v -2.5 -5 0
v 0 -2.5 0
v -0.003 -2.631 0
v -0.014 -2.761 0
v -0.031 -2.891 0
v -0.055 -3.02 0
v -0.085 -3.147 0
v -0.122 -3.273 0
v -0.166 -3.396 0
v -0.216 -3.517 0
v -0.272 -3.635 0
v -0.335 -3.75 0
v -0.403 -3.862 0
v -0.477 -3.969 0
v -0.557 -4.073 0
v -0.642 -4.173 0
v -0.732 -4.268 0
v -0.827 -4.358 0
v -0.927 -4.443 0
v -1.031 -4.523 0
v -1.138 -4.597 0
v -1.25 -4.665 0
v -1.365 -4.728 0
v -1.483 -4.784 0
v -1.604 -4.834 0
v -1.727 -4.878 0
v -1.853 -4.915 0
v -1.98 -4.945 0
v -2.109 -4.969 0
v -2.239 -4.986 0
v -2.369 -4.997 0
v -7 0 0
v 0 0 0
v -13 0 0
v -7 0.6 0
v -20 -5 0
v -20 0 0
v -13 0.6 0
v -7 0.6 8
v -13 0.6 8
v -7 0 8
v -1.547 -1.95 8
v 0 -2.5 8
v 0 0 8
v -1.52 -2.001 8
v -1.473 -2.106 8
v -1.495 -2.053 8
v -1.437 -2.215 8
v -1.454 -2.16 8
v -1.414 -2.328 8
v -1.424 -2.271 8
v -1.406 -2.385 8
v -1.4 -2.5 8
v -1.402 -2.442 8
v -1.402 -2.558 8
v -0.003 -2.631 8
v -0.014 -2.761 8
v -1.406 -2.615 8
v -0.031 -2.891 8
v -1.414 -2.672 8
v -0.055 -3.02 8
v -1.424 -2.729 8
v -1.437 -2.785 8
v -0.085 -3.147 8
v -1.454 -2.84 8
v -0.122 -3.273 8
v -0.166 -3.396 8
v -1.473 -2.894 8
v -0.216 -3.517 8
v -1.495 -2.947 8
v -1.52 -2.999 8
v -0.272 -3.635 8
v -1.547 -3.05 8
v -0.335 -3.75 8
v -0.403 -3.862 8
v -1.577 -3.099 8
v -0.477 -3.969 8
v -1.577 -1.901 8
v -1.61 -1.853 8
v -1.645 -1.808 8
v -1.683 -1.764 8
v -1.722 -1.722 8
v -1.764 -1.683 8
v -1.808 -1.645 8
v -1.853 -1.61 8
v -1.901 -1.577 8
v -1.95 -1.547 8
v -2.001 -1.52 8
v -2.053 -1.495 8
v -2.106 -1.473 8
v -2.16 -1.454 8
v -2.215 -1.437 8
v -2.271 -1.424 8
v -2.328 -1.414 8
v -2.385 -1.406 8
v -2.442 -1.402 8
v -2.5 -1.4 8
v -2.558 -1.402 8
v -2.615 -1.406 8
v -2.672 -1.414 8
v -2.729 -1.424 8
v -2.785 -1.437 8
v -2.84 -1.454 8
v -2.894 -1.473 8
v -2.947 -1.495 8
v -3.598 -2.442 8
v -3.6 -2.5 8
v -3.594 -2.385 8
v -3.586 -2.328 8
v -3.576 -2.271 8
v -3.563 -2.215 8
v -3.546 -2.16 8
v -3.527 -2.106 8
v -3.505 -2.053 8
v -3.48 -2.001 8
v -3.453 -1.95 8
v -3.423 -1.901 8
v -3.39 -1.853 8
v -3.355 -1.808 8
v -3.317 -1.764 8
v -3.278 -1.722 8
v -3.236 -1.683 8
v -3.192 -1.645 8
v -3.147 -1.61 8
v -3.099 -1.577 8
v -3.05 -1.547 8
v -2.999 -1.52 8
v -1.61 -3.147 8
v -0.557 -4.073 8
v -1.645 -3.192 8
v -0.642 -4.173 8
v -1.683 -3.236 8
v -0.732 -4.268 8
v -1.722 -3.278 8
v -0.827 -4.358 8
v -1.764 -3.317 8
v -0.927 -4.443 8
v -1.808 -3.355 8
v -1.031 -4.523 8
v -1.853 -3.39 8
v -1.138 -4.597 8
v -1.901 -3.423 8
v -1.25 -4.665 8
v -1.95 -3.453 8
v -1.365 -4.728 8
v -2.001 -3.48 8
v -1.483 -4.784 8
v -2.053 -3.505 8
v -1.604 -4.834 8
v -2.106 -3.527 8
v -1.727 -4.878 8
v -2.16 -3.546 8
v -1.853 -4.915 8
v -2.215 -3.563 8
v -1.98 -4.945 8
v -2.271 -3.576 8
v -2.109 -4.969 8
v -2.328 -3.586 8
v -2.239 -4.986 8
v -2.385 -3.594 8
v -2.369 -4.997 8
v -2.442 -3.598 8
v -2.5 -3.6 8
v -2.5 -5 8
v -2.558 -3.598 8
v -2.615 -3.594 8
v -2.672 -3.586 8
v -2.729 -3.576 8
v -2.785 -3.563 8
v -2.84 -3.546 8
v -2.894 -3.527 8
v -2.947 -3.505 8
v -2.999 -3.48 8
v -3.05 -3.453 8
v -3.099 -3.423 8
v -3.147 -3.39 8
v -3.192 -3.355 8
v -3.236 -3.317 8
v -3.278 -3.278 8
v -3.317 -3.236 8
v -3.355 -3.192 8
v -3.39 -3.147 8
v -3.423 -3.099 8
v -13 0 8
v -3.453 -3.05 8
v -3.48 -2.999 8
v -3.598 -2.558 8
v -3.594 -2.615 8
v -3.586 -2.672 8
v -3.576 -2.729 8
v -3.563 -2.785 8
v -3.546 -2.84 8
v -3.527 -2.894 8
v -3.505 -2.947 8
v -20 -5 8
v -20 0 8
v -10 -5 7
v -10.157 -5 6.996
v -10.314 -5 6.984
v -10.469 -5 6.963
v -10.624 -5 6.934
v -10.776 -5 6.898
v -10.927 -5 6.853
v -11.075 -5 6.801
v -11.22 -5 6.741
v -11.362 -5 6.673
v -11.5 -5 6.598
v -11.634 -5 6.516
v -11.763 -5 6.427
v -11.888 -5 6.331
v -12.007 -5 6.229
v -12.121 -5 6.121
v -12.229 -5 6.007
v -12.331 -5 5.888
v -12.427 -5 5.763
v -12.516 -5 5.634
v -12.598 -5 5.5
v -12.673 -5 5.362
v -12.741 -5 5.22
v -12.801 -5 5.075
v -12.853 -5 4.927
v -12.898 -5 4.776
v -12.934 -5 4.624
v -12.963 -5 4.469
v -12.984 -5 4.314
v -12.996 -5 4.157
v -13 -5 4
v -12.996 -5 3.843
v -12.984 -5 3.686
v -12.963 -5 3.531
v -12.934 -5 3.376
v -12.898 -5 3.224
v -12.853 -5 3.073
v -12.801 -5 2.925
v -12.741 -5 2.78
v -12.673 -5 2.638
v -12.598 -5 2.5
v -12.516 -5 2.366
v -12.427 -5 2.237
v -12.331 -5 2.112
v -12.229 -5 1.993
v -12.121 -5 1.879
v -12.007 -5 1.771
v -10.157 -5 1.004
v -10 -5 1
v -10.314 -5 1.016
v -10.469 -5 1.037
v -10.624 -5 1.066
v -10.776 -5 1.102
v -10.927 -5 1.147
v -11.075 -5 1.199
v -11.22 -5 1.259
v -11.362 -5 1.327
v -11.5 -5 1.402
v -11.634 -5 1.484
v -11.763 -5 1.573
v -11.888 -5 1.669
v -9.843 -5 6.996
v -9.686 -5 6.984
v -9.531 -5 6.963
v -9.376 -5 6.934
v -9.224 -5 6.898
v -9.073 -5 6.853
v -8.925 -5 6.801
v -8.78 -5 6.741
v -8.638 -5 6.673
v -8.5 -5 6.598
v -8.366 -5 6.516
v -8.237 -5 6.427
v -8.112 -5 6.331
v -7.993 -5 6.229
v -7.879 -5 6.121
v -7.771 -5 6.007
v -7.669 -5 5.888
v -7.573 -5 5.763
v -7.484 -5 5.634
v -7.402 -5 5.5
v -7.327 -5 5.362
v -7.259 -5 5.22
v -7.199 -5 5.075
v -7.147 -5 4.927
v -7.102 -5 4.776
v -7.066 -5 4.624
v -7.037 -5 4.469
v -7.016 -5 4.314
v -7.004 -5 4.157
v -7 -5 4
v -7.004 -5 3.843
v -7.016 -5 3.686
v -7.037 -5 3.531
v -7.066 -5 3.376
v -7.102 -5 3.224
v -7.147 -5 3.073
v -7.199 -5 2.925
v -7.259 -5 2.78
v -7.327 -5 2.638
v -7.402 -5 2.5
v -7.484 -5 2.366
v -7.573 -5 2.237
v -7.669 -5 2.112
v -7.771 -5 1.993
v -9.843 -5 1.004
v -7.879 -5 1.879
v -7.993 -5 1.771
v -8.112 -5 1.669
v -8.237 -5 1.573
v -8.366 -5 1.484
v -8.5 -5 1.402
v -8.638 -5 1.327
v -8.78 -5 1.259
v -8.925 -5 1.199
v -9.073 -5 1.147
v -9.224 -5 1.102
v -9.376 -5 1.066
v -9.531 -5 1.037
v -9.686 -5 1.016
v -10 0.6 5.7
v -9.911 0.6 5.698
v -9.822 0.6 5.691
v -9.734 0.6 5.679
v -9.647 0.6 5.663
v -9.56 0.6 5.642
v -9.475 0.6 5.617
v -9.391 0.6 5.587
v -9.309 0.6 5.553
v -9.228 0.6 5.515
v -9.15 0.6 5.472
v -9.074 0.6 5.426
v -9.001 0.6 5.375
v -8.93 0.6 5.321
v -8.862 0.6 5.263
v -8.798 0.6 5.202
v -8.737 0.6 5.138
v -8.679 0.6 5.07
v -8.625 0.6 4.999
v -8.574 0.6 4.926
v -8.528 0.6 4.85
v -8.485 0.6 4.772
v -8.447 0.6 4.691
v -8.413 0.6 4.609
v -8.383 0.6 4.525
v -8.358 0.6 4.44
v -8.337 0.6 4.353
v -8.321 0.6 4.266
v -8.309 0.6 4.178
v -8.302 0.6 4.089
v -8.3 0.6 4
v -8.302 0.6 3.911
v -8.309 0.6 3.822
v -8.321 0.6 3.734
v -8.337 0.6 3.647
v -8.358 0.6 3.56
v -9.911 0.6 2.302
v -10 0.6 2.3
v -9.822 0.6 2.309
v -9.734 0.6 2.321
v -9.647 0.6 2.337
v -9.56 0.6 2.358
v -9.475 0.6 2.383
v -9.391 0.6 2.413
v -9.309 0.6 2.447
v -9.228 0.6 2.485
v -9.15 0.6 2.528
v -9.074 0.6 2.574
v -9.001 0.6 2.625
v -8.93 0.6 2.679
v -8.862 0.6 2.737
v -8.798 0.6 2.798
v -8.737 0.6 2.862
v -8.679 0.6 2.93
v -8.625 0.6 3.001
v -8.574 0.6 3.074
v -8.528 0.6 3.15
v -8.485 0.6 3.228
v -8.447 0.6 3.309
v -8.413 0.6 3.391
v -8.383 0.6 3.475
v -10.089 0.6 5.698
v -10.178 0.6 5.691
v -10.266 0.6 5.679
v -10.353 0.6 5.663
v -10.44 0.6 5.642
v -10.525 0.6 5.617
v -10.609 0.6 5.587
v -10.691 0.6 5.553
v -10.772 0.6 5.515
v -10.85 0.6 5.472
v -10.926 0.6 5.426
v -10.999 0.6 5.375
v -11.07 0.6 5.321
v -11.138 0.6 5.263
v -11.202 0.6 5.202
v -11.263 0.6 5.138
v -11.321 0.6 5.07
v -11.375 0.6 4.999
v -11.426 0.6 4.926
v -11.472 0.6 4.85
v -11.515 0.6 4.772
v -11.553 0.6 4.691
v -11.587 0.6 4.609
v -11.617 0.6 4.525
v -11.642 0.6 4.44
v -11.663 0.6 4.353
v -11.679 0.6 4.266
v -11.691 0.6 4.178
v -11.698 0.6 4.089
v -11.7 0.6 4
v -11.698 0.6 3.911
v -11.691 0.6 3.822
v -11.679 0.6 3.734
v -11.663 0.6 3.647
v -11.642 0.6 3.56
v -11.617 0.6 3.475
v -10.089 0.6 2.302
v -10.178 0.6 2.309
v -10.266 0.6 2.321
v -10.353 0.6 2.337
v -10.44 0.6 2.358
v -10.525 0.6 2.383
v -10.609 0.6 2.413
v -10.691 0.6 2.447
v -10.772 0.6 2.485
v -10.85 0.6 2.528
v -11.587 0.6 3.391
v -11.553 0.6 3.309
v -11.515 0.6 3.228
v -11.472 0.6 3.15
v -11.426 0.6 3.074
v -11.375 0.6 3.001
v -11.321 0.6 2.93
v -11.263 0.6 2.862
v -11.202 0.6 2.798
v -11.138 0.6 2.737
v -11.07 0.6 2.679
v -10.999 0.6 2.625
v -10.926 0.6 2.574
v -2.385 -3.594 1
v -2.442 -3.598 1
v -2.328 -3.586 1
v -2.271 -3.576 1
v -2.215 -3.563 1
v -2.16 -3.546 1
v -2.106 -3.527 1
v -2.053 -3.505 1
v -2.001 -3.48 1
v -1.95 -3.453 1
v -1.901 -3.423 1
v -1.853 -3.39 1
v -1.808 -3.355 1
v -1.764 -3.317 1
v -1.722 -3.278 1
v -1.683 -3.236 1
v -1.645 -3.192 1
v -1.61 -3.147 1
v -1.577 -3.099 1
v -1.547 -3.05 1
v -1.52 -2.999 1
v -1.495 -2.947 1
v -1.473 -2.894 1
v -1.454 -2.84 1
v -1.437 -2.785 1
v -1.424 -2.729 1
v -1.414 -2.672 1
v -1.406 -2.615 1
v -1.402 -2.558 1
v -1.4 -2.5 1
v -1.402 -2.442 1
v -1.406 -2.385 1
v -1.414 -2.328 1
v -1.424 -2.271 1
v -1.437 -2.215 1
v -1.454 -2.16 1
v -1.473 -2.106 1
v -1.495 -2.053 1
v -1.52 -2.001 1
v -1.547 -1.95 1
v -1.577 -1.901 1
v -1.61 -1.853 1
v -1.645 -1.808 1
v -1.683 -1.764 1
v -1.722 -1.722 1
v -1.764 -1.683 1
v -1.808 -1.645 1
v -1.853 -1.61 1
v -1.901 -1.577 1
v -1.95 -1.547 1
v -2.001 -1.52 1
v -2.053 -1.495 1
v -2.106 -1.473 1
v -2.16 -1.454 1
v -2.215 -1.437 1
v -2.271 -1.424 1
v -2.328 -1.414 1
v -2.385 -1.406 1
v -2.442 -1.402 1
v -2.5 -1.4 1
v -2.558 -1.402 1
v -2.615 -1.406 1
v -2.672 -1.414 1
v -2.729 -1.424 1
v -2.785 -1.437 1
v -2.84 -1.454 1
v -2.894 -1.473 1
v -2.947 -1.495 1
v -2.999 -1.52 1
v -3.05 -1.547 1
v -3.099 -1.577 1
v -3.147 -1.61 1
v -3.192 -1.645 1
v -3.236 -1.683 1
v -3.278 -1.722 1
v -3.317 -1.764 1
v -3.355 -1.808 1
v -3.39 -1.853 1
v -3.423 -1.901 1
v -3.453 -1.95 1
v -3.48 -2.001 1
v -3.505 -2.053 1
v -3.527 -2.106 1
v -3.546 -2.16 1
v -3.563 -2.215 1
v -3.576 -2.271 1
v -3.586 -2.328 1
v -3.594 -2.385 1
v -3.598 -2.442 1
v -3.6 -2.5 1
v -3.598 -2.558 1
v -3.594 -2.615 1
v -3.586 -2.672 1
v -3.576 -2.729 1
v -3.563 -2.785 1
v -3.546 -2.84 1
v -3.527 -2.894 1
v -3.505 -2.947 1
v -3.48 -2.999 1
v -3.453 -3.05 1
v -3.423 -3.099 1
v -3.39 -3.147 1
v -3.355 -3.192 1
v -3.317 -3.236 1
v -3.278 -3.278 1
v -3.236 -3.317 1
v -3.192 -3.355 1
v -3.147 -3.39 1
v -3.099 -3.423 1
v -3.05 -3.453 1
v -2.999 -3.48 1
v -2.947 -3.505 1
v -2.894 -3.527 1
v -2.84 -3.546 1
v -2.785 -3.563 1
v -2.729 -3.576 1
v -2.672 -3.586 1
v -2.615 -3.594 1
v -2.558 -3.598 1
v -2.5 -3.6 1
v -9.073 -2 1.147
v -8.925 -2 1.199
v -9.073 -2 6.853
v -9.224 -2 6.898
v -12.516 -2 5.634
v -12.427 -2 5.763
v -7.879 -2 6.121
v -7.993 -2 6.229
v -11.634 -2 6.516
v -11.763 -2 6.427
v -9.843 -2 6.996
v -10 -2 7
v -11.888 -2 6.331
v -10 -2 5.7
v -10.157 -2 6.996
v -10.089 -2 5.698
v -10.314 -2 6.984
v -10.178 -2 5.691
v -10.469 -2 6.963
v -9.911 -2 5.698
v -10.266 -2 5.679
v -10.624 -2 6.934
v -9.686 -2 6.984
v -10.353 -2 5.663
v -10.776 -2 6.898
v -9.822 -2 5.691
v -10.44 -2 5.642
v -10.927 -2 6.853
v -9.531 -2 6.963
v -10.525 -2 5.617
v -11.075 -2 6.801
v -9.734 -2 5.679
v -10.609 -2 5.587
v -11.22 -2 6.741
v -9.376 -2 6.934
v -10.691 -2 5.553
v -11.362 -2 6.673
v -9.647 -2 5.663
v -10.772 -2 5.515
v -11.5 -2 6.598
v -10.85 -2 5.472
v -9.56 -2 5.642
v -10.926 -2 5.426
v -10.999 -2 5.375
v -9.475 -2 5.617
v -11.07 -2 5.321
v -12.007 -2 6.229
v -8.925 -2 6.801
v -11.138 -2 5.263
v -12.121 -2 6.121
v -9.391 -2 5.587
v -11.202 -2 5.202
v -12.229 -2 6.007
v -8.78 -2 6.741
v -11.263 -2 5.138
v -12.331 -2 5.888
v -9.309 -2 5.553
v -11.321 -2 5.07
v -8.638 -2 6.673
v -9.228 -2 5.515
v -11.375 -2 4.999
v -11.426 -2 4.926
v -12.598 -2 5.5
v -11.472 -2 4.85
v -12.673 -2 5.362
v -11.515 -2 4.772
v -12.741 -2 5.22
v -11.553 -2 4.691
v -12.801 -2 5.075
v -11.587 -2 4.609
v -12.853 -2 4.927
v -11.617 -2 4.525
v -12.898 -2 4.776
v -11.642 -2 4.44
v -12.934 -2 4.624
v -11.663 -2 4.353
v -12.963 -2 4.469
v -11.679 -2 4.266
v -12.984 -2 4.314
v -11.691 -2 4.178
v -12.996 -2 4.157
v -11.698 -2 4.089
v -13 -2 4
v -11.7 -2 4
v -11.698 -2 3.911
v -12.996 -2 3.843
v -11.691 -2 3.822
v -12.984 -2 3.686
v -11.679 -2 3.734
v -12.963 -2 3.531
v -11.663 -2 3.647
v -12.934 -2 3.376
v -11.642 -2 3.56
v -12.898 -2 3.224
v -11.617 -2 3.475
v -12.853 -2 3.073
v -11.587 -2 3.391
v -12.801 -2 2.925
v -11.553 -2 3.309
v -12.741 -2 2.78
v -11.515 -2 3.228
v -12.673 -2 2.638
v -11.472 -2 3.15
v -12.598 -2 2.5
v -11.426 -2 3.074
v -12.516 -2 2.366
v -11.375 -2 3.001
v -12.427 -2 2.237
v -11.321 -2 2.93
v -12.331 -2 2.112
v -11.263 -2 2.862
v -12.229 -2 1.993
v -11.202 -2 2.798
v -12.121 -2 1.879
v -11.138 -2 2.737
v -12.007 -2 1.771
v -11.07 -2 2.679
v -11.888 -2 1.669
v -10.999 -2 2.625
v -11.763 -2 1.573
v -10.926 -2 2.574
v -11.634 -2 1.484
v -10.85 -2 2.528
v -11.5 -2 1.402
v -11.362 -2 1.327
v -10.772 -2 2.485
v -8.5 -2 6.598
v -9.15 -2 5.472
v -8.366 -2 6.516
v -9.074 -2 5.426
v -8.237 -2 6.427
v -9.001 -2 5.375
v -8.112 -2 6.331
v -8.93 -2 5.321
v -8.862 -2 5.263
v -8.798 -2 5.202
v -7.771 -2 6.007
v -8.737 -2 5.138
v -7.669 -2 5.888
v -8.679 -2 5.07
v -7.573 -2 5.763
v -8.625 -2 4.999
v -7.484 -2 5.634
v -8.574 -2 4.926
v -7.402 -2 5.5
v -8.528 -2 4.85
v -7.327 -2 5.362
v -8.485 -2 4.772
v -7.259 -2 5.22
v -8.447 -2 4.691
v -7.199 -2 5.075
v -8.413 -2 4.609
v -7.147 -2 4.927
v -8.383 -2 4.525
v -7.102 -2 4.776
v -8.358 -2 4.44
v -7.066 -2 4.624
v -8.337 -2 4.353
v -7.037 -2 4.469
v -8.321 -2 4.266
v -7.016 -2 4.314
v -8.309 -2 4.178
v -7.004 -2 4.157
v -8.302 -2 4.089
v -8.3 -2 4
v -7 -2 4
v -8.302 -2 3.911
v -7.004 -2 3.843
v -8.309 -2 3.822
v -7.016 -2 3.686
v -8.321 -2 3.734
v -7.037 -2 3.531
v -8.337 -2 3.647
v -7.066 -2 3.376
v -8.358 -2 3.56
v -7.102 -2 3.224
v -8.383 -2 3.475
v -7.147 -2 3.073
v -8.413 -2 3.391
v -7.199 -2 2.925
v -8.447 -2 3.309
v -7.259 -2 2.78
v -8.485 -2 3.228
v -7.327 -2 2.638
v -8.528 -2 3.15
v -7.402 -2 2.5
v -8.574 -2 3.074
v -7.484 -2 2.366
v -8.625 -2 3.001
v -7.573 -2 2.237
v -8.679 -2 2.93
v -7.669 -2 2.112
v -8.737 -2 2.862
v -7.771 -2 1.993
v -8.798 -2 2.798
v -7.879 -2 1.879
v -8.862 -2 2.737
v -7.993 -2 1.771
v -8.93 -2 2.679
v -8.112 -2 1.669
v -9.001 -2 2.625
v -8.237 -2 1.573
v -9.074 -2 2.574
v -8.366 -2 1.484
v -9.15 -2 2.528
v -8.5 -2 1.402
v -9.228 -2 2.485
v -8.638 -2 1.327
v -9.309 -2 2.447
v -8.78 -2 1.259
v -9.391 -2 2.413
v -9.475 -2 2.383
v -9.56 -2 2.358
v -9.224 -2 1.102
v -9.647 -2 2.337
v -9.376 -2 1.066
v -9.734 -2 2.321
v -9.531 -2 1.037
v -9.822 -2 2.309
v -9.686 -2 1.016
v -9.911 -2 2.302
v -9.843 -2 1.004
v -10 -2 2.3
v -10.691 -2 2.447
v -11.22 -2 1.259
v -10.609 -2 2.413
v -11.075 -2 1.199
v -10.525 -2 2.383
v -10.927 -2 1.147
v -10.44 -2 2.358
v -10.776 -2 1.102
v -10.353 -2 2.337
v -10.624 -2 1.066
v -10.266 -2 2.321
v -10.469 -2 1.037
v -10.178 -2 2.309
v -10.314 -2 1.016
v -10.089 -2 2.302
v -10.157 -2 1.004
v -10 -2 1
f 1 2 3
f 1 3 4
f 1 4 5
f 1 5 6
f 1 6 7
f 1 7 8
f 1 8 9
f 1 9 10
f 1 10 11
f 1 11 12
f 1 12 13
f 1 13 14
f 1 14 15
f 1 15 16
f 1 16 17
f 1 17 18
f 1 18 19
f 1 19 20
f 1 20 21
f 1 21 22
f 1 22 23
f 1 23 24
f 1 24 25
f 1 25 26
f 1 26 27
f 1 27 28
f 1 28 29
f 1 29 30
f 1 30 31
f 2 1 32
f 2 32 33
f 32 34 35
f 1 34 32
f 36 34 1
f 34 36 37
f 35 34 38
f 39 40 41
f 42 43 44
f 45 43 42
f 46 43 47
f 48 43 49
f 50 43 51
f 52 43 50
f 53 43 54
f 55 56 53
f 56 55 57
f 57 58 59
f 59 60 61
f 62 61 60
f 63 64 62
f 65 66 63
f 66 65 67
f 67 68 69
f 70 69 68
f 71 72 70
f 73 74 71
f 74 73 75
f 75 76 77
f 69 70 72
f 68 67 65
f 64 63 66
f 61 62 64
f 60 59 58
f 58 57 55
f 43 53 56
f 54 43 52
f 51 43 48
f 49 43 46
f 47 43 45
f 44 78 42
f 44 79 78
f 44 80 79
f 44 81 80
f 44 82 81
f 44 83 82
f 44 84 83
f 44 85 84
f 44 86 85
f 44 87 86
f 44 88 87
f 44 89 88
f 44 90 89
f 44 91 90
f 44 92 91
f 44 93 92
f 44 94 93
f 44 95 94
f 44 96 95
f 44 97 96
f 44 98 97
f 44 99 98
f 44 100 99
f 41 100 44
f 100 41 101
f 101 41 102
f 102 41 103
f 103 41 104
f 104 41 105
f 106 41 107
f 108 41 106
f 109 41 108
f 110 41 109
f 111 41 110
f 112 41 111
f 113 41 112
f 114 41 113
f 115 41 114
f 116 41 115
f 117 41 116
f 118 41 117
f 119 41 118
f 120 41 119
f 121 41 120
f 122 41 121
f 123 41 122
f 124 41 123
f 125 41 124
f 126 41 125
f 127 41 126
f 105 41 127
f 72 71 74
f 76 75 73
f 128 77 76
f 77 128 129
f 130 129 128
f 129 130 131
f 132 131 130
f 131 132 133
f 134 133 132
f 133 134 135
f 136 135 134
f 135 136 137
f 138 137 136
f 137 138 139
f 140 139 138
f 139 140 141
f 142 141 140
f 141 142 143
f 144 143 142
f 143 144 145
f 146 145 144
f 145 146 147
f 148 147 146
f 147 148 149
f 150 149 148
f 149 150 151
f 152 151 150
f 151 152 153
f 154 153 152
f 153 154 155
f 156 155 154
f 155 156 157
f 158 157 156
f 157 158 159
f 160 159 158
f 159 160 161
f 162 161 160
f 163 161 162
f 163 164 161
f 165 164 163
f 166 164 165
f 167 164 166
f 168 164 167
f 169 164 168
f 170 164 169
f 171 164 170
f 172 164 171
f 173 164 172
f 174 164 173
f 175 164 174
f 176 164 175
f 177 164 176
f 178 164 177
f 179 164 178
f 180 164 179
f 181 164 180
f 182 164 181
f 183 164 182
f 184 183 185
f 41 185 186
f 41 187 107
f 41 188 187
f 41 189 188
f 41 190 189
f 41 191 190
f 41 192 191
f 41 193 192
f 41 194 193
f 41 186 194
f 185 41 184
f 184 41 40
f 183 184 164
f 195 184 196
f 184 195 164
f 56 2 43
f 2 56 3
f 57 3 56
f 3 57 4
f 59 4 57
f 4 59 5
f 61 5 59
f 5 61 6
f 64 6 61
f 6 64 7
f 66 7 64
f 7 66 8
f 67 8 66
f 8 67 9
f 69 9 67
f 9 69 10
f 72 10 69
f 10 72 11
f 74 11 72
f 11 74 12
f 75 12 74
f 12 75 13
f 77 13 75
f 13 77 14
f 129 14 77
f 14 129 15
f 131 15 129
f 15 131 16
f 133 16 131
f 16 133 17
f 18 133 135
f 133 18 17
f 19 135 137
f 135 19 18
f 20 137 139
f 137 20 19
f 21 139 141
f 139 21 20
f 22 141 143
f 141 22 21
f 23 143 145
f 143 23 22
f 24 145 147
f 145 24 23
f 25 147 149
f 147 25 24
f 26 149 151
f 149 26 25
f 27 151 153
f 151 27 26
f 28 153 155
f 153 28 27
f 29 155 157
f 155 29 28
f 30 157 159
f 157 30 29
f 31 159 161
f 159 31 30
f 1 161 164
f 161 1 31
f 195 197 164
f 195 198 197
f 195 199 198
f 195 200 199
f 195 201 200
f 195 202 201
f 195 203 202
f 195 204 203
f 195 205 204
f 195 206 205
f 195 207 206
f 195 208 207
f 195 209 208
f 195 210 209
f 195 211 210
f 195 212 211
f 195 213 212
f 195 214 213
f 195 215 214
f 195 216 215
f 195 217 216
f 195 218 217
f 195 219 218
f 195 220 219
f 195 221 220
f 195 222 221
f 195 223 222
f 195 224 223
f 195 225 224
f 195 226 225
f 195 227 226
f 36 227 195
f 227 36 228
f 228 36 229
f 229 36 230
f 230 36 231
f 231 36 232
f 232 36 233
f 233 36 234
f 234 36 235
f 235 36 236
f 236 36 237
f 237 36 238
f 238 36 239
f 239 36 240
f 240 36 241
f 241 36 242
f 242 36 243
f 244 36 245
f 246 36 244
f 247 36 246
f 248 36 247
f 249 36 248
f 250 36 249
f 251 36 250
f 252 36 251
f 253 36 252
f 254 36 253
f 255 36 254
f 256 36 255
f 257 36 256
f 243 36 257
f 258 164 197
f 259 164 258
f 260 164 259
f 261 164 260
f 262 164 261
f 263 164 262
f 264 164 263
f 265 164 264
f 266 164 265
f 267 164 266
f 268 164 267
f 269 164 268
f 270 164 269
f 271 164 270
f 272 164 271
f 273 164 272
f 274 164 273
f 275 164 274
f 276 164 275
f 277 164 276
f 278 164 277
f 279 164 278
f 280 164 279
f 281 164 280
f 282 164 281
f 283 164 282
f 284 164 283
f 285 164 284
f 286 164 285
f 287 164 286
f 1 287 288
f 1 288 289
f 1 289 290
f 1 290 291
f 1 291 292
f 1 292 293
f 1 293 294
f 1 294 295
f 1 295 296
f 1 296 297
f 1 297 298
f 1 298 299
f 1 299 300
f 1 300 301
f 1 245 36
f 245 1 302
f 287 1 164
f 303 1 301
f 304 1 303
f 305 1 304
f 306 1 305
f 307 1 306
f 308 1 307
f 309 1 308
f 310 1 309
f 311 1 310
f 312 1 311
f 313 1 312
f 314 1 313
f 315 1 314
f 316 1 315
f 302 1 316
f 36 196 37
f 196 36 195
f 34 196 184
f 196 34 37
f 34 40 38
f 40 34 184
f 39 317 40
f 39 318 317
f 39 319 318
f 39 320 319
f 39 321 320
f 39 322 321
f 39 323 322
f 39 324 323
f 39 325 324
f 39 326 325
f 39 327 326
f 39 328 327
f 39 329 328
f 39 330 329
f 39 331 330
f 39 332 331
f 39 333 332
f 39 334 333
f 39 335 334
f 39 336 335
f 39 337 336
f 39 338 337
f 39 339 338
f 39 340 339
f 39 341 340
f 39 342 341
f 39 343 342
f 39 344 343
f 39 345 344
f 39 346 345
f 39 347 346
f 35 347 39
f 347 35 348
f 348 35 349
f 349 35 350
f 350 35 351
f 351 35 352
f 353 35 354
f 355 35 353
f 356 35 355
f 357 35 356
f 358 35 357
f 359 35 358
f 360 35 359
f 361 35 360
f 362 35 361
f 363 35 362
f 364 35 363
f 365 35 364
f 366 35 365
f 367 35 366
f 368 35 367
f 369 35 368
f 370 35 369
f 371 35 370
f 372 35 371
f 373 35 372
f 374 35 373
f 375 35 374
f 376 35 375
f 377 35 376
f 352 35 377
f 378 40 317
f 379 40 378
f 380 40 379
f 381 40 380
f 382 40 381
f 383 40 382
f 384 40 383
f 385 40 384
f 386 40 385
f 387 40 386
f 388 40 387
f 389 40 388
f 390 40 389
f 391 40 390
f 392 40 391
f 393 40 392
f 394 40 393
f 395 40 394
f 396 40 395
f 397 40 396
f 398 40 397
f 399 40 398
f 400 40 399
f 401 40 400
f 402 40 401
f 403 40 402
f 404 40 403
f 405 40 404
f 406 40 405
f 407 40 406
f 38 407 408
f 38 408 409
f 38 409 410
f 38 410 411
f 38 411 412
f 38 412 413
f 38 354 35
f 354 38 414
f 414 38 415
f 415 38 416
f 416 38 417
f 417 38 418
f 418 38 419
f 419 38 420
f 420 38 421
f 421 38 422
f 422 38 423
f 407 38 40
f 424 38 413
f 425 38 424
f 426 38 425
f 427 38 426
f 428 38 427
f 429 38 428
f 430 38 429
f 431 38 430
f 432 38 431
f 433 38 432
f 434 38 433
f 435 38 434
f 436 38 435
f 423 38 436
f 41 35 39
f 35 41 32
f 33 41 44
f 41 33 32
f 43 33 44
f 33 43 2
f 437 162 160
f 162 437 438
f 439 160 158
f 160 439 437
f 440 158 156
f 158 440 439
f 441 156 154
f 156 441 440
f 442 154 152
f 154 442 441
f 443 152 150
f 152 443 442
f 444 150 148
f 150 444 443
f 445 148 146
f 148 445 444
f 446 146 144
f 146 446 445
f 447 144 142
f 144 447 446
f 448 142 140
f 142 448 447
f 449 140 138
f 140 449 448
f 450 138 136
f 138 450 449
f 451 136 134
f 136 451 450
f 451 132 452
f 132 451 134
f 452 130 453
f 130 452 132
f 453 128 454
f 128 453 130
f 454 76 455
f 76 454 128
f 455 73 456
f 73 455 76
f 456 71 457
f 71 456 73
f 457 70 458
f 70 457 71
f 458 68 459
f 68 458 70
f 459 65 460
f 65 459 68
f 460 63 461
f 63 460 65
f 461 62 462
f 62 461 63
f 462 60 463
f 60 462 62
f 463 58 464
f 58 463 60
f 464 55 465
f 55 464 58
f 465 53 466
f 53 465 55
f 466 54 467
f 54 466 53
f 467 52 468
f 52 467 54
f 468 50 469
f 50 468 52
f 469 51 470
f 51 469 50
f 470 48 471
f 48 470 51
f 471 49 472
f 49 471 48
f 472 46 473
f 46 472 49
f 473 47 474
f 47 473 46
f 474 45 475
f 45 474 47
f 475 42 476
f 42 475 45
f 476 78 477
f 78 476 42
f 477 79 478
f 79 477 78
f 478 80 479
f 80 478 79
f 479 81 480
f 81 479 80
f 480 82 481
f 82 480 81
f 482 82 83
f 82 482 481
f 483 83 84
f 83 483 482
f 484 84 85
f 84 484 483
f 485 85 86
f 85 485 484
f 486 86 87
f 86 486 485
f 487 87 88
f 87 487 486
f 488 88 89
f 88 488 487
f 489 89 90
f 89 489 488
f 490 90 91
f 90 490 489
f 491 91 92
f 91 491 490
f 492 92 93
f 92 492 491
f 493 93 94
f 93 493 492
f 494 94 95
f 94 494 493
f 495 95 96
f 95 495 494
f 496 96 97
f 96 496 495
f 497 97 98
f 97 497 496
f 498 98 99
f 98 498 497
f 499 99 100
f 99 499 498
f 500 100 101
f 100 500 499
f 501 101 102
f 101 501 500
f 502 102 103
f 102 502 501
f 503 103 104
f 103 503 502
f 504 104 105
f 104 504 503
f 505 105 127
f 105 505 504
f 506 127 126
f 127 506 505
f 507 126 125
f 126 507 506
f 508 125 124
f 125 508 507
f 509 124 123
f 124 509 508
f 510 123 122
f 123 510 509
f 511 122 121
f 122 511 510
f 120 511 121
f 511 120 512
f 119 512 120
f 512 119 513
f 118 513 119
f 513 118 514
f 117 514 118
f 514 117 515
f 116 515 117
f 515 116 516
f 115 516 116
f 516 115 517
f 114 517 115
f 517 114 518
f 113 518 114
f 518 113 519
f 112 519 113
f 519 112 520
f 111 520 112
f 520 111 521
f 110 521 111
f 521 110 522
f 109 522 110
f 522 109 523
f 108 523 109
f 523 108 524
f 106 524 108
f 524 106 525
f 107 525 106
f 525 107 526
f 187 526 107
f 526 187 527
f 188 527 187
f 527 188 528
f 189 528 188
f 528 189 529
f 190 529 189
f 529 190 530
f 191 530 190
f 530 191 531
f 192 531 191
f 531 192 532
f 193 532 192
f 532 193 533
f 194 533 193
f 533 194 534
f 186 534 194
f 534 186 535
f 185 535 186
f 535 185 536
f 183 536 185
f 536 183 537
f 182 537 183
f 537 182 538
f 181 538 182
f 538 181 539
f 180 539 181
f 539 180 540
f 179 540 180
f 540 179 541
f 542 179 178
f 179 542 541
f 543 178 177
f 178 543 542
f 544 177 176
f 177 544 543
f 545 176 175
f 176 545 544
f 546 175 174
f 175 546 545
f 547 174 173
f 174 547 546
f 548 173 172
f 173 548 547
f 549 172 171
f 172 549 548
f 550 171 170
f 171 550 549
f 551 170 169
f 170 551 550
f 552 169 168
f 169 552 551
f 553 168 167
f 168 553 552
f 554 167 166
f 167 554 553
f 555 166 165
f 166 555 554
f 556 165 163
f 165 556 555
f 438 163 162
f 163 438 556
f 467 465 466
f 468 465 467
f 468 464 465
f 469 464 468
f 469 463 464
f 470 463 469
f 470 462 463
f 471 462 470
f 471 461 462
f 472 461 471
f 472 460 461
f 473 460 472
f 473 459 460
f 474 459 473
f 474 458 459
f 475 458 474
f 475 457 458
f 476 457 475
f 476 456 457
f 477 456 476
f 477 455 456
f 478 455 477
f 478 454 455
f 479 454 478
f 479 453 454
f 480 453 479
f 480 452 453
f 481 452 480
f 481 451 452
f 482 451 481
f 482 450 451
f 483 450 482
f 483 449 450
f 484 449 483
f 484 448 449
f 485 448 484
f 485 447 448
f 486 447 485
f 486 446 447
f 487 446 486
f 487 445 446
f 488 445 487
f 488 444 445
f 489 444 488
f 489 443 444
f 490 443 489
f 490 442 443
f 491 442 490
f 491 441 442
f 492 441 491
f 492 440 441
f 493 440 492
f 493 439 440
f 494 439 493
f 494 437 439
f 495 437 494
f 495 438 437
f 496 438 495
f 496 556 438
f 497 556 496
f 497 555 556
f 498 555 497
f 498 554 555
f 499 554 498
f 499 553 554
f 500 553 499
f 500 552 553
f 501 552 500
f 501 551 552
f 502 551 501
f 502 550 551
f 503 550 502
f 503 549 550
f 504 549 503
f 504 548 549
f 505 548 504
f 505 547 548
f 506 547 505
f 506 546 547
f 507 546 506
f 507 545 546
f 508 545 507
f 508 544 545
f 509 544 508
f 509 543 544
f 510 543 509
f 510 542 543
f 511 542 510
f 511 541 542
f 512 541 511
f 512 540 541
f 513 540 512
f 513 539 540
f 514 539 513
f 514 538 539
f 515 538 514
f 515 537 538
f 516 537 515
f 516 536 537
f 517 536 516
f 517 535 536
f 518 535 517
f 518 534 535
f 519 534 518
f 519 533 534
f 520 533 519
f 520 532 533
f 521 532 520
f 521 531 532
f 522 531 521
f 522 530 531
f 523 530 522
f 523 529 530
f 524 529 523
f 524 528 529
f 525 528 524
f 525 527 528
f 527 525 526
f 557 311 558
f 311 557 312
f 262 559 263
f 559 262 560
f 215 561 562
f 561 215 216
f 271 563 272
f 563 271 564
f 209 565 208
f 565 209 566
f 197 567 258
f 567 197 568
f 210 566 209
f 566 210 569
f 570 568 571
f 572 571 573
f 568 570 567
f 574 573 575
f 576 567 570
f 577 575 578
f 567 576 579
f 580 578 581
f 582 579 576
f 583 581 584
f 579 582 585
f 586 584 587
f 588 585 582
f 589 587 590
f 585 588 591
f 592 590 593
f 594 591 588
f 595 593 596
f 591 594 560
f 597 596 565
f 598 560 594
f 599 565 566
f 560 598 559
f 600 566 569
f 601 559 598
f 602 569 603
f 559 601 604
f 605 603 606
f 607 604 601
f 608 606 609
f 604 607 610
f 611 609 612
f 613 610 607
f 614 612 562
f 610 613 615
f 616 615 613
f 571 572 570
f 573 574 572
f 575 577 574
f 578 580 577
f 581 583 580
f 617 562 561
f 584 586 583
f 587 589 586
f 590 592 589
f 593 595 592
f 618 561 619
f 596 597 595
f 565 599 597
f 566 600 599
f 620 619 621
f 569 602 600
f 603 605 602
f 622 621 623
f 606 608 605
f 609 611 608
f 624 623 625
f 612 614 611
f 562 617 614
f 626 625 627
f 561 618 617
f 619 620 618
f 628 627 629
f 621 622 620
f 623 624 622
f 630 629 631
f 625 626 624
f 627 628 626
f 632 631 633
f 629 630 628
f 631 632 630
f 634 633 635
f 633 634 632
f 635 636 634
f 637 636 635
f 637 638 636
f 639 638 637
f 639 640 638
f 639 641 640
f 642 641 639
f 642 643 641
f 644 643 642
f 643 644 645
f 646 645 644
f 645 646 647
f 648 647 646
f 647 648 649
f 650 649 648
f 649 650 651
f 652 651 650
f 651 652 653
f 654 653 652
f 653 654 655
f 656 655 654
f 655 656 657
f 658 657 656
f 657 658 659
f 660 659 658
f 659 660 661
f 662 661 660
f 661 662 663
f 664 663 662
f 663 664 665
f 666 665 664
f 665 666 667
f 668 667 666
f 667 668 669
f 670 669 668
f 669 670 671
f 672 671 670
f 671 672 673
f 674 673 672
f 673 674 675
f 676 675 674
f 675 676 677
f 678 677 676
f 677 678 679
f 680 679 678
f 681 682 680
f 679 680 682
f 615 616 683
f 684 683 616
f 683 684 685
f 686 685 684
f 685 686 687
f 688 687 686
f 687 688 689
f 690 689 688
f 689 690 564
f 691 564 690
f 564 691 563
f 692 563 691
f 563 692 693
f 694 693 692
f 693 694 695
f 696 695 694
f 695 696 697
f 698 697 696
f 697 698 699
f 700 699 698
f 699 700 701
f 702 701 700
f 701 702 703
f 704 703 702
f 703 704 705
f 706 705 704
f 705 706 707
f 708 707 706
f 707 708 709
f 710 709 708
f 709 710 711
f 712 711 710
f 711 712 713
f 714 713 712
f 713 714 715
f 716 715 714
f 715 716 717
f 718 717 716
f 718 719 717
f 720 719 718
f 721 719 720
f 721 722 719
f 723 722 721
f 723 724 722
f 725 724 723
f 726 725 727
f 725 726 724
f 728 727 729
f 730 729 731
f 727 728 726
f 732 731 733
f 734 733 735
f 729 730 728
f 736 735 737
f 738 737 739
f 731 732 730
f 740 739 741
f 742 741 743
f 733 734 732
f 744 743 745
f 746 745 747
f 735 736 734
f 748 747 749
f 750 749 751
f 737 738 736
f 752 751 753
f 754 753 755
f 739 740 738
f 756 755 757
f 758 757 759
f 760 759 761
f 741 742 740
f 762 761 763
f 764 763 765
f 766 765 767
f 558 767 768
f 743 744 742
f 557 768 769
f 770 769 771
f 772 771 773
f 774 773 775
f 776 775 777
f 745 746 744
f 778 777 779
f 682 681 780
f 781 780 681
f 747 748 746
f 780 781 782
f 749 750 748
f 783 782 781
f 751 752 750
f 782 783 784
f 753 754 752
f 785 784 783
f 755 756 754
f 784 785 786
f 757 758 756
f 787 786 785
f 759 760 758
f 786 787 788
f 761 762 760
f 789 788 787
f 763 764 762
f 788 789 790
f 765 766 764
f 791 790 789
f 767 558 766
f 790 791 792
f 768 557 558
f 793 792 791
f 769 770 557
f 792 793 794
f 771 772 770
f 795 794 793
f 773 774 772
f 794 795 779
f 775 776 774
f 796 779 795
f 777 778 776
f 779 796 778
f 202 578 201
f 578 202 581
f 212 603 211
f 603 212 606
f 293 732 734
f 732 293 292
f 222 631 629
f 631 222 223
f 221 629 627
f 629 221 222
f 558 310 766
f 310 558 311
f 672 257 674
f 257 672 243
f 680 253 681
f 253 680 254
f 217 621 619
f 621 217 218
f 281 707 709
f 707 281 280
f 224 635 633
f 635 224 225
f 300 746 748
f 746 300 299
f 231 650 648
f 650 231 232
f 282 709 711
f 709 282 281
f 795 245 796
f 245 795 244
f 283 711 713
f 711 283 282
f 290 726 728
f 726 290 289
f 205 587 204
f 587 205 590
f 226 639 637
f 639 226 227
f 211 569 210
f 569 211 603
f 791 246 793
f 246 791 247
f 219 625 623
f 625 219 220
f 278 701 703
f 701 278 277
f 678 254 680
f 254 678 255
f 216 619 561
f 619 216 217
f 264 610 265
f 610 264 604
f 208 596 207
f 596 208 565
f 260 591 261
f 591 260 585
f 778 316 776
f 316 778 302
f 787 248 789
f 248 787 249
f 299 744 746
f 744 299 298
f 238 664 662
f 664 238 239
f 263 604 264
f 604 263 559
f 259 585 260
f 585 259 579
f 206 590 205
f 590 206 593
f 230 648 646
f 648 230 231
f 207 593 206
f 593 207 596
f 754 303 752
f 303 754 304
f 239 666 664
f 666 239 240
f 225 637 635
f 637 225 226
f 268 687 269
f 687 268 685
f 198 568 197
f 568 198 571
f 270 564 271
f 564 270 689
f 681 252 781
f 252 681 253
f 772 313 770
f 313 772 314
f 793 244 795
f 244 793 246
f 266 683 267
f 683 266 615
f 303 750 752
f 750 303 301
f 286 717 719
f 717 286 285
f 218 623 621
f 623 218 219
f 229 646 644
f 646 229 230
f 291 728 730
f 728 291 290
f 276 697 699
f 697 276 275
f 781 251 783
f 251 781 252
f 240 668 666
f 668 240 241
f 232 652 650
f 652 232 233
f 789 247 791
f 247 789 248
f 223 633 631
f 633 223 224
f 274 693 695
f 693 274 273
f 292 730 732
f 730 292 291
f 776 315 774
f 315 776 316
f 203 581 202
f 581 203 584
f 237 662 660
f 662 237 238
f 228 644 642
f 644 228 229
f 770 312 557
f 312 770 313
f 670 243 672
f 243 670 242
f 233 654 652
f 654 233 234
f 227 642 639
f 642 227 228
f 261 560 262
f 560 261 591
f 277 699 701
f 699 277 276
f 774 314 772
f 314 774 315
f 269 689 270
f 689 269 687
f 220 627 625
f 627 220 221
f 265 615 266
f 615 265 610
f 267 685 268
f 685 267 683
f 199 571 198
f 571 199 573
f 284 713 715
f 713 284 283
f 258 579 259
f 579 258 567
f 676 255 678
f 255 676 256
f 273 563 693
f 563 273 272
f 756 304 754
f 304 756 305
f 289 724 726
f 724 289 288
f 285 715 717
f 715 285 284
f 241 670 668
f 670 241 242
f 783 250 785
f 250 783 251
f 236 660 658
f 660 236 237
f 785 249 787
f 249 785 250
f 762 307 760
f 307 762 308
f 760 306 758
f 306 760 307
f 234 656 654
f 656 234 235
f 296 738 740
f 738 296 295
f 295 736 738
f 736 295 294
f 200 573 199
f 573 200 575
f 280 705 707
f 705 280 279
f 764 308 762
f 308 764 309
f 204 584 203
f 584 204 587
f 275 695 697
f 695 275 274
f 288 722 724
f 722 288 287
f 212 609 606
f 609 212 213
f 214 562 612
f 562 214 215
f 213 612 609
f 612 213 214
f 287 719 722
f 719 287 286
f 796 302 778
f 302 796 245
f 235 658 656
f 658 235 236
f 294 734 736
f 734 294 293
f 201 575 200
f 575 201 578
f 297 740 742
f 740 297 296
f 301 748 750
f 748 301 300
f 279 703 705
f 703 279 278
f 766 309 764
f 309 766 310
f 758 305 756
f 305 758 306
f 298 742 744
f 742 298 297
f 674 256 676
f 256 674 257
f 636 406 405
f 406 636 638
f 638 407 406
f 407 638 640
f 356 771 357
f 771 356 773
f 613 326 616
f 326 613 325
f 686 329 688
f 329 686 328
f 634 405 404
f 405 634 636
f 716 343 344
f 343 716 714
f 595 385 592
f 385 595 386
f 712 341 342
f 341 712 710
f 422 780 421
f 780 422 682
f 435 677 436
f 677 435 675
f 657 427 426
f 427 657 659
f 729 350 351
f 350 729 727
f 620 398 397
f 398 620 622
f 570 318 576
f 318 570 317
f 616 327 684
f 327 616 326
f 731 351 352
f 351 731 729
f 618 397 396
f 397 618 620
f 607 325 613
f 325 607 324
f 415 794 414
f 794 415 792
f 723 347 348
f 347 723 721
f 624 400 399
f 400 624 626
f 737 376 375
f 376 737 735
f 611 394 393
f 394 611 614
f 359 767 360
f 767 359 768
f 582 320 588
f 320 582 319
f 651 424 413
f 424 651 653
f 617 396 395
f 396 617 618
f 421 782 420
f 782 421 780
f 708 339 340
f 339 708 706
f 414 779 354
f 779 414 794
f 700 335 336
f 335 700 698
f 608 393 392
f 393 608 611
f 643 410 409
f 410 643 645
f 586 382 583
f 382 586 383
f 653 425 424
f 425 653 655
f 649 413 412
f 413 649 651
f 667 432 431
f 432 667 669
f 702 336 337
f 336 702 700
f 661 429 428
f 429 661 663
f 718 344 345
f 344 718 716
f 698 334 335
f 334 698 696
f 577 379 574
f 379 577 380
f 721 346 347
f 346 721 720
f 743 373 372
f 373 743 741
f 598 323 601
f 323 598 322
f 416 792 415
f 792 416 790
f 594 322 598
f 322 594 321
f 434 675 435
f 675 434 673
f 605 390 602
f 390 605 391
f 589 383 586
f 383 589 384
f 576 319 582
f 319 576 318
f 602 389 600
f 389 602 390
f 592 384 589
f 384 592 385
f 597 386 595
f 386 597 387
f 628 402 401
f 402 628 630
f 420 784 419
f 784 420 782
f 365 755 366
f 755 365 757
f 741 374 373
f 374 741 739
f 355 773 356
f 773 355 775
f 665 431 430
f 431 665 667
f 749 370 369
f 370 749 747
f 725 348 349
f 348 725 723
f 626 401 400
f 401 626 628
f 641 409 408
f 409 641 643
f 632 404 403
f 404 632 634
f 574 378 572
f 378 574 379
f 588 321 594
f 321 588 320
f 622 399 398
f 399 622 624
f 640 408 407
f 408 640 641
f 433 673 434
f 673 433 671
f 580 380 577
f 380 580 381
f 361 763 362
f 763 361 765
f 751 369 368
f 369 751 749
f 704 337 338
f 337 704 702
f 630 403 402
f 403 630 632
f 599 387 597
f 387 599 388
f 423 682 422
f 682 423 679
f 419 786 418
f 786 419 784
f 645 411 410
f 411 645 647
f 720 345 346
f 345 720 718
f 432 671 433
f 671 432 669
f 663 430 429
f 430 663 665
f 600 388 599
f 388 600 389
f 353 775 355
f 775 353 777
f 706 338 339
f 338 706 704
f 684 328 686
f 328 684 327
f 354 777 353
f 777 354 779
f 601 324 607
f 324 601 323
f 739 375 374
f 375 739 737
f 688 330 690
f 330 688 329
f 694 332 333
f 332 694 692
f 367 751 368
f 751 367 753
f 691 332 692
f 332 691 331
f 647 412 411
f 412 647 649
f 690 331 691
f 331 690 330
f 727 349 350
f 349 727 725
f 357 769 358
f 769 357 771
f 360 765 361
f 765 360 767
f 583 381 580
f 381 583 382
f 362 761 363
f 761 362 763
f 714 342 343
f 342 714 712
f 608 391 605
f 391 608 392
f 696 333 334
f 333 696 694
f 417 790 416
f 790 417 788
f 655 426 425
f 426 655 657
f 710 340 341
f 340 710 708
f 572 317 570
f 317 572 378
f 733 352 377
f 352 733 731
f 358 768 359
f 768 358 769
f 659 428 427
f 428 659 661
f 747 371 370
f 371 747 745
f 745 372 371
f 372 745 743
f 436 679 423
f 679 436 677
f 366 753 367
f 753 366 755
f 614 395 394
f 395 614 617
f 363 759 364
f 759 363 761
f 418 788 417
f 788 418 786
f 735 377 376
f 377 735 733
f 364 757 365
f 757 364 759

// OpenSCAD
use <btt tft43 mount.scad>

$fn = 120;
mirror([1,0,0])hinge();
